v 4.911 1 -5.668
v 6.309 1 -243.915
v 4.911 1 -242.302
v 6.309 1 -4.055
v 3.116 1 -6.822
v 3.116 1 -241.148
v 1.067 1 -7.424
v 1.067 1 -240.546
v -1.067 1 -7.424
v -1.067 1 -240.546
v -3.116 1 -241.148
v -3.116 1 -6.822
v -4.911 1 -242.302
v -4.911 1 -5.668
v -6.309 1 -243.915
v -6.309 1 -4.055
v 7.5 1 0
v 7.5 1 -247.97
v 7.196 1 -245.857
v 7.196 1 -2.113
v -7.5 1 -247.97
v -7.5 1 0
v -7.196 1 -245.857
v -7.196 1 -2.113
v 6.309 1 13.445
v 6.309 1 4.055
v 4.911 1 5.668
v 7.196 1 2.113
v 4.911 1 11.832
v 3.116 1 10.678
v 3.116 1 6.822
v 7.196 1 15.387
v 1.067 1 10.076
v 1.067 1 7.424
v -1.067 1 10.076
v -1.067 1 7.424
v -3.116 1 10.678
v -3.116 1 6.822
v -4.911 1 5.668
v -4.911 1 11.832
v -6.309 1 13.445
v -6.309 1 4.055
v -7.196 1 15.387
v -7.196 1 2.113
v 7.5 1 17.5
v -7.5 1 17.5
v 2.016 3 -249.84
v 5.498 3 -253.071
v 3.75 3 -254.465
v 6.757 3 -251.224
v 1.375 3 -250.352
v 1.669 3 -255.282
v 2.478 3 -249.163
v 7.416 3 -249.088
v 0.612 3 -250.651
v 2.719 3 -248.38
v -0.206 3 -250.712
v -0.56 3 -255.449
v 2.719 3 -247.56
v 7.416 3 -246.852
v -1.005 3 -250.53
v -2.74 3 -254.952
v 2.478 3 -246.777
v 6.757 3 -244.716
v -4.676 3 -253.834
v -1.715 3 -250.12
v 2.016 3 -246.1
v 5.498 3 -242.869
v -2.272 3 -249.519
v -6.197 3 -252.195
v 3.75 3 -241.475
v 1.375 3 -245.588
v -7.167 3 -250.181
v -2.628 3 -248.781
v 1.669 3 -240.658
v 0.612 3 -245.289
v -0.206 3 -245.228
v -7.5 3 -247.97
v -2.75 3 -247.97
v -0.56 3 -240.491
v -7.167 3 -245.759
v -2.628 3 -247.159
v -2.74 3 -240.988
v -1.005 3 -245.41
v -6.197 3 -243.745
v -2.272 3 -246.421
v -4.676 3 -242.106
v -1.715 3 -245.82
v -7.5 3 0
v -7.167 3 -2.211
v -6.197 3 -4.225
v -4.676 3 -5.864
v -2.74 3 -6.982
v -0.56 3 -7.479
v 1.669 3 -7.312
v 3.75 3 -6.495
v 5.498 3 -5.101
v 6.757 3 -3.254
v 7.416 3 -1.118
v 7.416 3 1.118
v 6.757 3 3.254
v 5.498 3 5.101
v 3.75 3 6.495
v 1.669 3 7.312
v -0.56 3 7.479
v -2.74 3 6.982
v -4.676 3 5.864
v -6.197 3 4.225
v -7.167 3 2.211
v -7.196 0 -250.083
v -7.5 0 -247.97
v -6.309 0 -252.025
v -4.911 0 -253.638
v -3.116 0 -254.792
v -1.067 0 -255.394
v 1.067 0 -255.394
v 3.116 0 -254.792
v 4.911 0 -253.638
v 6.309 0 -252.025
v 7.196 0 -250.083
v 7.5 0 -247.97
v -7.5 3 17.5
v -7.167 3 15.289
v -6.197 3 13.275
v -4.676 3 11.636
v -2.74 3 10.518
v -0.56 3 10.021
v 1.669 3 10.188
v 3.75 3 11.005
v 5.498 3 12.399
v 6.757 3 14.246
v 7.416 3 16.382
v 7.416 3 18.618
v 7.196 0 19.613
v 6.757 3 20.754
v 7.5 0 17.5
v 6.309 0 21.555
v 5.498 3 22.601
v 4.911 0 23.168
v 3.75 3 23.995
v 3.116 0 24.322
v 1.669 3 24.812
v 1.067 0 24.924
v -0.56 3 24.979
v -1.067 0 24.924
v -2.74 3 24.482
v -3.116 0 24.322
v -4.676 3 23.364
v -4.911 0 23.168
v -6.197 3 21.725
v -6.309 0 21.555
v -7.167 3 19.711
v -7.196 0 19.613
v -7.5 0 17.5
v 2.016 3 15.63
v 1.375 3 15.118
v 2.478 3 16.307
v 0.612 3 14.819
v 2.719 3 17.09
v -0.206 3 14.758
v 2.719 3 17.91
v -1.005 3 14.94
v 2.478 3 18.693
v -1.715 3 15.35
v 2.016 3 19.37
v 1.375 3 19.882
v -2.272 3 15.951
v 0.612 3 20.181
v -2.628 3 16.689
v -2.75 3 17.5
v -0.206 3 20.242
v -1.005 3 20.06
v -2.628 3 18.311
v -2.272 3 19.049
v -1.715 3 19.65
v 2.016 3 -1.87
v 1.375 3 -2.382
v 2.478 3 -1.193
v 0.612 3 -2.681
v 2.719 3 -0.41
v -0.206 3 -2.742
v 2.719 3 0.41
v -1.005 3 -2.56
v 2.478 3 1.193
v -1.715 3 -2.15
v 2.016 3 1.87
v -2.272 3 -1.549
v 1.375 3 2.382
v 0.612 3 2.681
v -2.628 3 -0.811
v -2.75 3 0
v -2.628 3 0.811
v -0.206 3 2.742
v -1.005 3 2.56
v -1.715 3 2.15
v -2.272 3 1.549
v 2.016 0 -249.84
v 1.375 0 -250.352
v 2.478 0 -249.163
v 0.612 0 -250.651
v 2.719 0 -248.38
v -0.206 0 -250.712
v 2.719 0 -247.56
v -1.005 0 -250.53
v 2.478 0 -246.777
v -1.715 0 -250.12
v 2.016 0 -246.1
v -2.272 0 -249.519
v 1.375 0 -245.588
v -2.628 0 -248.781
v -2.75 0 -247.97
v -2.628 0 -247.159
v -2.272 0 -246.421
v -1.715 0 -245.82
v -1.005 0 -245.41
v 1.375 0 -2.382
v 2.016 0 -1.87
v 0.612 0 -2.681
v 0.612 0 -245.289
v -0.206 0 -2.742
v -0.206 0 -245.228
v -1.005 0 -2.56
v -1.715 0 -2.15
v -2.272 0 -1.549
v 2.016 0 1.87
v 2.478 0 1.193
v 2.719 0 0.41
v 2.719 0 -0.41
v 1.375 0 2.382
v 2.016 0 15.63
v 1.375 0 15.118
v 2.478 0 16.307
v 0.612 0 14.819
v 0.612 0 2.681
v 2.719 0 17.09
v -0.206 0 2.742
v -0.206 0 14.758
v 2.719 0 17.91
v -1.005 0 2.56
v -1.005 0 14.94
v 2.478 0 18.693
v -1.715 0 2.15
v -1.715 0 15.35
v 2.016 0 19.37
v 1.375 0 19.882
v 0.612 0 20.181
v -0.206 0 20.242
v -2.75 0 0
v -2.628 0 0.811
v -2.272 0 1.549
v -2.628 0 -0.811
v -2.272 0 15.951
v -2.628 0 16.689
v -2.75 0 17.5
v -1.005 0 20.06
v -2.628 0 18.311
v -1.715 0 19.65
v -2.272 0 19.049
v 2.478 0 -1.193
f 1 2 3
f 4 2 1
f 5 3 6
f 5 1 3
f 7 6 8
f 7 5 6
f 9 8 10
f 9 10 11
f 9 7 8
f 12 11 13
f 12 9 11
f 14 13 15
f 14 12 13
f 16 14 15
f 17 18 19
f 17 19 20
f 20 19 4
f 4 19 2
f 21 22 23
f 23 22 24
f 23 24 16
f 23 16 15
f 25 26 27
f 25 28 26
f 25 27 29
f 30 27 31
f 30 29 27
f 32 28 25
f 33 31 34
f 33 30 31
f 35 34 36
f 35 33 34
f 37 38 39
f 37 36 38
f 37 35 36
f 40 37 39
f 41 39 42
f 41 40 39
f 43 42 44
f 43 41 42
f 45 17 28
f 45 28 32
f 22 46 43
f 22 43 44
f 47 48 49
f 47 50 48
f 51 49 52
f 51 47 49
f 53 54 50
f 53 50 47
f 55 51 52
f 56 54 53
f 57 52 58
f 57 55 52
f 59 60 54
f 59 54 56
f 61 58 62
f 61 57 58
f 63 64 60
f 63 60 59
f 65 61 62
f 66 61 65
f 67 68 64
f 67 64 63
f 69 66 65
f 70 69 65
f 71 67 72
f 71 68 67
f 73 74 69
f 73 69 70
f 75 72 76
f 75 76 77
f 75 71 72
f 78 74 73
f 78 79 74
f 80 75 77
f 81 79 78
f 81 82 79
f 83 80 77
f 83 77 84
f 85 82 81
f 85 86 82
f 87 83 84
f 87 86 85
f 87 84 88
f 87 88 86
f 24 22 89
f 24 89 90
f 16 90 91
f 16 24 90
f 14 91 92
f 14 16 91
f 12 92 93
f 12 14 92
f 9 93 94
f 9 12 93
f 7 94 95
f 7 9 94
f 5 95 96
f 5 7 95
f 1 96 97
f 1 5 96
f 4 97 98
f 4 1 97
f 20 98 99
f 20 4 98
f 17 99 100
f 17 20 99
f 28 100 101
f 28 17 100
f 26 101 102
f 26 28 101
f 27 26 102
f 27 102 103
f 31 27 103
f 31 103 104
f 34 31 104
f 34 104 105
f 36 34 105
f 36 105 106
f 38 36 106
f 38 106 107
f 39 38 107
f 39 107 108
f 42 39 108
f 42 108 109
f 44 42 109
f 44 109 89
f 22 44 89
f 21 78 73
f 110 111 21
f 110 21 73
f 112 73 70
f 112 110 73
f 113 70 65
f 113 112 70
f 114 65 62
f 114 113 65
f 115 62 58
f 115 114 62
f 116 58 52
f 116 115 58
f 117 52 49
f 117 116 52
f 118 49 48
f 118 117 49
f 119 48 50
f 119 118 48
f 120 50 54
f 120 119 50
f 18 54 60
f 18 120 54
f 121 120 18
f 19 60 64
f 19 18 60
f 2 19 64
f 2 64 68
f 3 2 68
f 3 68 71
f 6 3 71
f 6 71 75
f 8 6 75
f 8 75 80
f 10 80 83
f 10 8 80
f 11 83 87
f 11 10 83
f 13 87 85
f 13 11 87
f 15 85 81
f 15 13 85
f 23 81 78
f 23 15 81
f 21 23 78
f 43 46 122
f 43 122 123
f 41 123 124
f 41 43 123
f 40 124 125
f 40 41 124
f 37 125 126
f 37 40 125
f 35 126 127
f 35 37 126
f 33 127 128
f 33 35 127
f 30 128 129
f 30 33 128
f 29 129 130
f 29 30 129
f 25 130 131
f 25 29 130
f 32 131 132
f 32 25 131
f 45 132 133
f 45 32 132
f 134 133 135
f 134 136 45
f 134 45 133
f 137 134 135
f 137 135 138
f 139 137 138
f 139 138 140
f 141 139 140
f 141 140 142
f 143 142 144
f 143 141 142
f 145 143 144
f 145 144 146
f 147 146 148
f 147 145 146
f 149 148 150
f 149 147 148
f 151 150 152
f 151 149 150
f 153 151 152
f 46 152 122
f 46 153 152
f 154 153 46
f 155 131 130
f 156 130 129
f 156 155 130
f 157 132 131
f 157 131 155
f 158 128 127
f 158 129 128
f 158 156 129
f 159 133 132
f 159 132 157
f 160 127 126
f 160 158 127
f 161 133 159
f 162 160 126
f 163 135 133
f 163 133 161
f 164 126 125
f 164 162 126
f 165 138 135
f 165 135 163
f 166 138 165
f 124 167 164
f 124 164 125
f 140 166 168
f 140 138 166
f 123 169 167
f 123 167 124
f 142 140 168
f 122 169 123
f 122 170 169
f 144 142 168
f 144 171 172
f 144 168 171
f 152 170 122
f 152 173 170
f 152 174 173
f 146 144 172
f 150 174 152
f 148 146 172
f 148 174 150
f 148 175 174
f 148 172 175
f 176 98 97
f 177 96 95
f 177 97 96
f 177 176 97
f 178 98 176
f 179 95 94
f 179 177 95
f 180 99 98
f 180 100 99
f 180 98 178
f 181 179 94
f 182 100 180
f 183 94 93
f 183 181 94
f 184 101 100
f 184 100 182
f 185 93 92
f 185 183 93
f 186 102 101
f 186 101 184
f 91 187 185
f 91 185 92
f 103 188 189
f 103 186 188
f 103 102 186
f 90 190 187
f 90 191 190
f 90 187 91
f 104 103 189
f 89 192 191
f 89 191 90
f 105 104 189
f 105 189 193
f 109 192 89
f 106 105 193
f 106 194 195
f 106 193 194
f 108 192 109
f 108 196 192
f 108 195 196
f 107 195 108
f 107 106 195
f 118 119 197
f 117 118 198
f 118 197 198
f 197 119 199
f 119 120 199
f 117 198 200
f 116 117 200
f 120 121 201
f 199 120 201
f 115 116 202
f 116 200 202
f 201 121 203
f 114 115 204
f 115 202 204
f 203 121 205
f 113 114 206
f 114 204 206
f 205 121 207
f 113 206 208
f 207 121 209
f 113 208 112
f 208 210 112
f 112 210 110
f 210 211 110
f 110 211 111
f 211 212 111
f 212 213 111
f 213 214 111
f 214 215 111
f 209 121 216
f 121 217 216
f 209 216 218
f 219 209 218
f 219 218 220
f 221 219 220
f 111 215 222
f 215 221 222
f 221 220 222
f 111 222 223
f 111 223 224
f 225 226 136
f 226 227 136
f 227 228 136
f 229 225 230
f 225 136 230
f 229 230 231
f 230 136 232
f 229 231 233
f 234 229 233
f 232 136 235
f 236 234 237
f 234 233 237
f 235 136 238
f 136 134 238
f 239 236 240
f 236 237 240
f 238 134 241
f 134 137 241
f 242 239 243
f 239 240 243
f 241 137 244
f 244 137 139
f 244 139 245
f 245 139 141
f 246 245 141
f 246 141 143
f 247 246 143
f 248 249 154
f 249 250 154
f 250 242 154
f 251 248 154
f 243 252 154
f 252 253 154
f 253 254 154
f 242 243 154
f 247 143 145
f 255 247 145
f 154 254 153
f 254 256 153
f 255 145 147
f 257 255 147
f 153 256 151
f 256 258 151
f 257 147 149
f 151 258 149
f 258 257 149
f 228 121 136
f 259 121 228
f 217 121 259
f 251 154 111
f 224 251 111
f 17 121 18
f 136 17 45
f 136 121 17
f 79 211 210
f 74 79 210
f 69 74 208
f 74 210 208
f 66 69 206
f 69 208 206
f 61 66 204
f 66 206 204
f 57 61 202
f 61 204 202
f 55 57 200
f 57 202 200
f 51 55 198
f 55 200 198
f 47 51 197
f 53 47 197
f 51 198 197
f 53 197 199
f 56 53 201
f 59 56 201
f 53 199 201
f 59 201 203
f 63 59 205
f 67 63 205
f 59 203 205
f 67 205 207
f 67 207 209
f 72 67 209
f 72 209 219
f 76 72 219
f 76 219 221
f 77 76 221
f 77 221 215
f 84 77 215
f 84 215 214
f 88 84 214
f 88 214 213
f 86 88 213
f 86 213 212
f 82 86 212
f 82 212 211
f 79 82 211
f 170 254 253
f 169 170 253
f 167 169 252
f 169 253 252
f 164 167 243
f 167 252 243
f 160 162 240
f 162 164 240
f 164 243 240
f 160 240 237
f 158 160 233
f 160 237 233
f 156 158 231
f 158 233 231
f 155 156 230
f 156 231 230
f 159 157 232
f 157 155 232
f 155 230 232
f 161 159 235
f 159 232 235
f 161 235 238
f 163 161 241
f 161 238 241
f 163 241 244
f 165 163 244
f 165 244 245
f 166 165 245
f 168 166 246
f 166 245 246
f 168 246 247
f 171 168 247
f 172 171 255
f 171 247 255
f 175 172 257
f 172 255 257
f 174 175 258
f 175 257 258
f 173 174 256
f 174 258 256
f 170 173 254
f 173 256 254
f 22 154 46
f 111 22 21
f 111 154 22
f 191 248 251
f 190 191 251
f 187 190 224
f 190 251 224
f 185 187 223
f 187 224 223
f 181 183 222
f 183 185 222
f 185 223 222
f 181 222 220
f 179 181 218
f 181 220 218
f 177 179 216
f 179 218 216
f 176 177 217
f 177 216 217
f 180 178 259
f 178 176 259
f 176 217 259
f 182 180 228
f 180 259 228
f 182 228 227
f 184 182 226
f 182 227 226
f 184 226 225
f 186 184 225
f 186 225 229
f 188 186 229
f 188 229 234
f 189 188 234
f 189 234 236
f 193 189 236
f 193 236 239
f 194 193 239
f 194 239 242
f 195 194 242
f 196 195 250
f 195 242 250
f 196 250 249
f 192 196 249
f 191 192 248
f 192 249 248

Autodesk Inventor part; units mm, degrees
ref_plane "YZ Plane" through (0, 0, 0) normal (1, 0, 0) x (0, 1, 0)
ref_plane "XZ Plane" through (0, 0, 0) normal (0, 1, 0) x (-1, 0, 0)
ref_plane "XY Plane" through (0, 0, 0) normal (0, 0, 1) x (1, 0, 0)
sketch "Sketch1" plane through (0, 0, 0) normal (0, 1, 0) x (-1, 0, 0)
  circle A0 centre (0, 0) radius 7.5
  circle A1 centre (0, 0) radius 2.75
  line L0 (-7.5, -247.97) -> (-7.5, 0)
  line L1 (7.5, 0) -> (7.5, -247.97)
  arc A2 (7.5, 0) -> (-7.5, 0) centre (0, 0) ccw
  line L2 (0, -255.47) -> (0, -240.47)
  circle A3 centre (0, -247.97) radius 2.75
  circle A4 centre (0, -247.97) radius 7.5
  line L3 (-7.5, 7.5) -> (-7.5, 10)
  line L4 (7.5, 10) -> (7.5, 7.5)
  line L5 (-7.5, 10) -> (-7.5, 17.5)
  line L6 (7.5, 17.5) -> (7.5, 10)
  circle A5 centre (0, 17.5) radius 7.5
  circle A6 centre (0, 17.5) radius 2.75
  line L7 (7.5, 7.5) -> (7.5, 0)
  line L8 (-7.5, 7.5) -> (-7.5, 0)
  line L9 (7.5, 0) -> (7.5, -247.97)
  line L10 (7.5, -123.985) -> (-7.5, -123.985)
  line L11 (-7.5, -255.47) -> (-7.5, -257.97)
  line L12 (7.5, -257.97) -> (7.5, -255.47)
  line L13 (-7.5, -257.97) -> (-7.5, -265.47)
  line L14 (7.5, -265.47) -> (7.5, -257.97)
  circle A7 centre (0, -265.47) radius 7.5
  circle A8 centre (0, -265.47) radius 2.75
  line L15 (7.5, -255.47) -> (7.5, -247.97)
  line L16 (-7.5, -255.47) -> (-7.5, -247.97)
  point P0 (7.5, 0)
  point P1 (-7.5, 0)
  point P2 (0, 7.5)
  point P3 (7.5, 0)
  dimension "d0" = 15
  dimension "d1" = 5.5
  dimension "d7" = 15
  dimension "d12" = 15
  dimension "d13" = 5.5
  dimension "d17" = 262.97
  dimension "d18" = 15
  dimension "d19" = 2.5
  dimension "d22" = 15
  dimension "d23" = 5.5
extrude "Extrusion2" add sketch "Sketch1" along normal blind 3 contours A0 | A4 L2 A3 | A4 L2 A3 | A5
extrude "Extrusion3" add sketch "Sketch1" along normal blind 1 contours L1 L10 L0 A0 | A0 L8 L3 L5 A5 L6 L4 L7 | L1 A4 L0 L10 | A5
properties part number "közepső szalag 1"
